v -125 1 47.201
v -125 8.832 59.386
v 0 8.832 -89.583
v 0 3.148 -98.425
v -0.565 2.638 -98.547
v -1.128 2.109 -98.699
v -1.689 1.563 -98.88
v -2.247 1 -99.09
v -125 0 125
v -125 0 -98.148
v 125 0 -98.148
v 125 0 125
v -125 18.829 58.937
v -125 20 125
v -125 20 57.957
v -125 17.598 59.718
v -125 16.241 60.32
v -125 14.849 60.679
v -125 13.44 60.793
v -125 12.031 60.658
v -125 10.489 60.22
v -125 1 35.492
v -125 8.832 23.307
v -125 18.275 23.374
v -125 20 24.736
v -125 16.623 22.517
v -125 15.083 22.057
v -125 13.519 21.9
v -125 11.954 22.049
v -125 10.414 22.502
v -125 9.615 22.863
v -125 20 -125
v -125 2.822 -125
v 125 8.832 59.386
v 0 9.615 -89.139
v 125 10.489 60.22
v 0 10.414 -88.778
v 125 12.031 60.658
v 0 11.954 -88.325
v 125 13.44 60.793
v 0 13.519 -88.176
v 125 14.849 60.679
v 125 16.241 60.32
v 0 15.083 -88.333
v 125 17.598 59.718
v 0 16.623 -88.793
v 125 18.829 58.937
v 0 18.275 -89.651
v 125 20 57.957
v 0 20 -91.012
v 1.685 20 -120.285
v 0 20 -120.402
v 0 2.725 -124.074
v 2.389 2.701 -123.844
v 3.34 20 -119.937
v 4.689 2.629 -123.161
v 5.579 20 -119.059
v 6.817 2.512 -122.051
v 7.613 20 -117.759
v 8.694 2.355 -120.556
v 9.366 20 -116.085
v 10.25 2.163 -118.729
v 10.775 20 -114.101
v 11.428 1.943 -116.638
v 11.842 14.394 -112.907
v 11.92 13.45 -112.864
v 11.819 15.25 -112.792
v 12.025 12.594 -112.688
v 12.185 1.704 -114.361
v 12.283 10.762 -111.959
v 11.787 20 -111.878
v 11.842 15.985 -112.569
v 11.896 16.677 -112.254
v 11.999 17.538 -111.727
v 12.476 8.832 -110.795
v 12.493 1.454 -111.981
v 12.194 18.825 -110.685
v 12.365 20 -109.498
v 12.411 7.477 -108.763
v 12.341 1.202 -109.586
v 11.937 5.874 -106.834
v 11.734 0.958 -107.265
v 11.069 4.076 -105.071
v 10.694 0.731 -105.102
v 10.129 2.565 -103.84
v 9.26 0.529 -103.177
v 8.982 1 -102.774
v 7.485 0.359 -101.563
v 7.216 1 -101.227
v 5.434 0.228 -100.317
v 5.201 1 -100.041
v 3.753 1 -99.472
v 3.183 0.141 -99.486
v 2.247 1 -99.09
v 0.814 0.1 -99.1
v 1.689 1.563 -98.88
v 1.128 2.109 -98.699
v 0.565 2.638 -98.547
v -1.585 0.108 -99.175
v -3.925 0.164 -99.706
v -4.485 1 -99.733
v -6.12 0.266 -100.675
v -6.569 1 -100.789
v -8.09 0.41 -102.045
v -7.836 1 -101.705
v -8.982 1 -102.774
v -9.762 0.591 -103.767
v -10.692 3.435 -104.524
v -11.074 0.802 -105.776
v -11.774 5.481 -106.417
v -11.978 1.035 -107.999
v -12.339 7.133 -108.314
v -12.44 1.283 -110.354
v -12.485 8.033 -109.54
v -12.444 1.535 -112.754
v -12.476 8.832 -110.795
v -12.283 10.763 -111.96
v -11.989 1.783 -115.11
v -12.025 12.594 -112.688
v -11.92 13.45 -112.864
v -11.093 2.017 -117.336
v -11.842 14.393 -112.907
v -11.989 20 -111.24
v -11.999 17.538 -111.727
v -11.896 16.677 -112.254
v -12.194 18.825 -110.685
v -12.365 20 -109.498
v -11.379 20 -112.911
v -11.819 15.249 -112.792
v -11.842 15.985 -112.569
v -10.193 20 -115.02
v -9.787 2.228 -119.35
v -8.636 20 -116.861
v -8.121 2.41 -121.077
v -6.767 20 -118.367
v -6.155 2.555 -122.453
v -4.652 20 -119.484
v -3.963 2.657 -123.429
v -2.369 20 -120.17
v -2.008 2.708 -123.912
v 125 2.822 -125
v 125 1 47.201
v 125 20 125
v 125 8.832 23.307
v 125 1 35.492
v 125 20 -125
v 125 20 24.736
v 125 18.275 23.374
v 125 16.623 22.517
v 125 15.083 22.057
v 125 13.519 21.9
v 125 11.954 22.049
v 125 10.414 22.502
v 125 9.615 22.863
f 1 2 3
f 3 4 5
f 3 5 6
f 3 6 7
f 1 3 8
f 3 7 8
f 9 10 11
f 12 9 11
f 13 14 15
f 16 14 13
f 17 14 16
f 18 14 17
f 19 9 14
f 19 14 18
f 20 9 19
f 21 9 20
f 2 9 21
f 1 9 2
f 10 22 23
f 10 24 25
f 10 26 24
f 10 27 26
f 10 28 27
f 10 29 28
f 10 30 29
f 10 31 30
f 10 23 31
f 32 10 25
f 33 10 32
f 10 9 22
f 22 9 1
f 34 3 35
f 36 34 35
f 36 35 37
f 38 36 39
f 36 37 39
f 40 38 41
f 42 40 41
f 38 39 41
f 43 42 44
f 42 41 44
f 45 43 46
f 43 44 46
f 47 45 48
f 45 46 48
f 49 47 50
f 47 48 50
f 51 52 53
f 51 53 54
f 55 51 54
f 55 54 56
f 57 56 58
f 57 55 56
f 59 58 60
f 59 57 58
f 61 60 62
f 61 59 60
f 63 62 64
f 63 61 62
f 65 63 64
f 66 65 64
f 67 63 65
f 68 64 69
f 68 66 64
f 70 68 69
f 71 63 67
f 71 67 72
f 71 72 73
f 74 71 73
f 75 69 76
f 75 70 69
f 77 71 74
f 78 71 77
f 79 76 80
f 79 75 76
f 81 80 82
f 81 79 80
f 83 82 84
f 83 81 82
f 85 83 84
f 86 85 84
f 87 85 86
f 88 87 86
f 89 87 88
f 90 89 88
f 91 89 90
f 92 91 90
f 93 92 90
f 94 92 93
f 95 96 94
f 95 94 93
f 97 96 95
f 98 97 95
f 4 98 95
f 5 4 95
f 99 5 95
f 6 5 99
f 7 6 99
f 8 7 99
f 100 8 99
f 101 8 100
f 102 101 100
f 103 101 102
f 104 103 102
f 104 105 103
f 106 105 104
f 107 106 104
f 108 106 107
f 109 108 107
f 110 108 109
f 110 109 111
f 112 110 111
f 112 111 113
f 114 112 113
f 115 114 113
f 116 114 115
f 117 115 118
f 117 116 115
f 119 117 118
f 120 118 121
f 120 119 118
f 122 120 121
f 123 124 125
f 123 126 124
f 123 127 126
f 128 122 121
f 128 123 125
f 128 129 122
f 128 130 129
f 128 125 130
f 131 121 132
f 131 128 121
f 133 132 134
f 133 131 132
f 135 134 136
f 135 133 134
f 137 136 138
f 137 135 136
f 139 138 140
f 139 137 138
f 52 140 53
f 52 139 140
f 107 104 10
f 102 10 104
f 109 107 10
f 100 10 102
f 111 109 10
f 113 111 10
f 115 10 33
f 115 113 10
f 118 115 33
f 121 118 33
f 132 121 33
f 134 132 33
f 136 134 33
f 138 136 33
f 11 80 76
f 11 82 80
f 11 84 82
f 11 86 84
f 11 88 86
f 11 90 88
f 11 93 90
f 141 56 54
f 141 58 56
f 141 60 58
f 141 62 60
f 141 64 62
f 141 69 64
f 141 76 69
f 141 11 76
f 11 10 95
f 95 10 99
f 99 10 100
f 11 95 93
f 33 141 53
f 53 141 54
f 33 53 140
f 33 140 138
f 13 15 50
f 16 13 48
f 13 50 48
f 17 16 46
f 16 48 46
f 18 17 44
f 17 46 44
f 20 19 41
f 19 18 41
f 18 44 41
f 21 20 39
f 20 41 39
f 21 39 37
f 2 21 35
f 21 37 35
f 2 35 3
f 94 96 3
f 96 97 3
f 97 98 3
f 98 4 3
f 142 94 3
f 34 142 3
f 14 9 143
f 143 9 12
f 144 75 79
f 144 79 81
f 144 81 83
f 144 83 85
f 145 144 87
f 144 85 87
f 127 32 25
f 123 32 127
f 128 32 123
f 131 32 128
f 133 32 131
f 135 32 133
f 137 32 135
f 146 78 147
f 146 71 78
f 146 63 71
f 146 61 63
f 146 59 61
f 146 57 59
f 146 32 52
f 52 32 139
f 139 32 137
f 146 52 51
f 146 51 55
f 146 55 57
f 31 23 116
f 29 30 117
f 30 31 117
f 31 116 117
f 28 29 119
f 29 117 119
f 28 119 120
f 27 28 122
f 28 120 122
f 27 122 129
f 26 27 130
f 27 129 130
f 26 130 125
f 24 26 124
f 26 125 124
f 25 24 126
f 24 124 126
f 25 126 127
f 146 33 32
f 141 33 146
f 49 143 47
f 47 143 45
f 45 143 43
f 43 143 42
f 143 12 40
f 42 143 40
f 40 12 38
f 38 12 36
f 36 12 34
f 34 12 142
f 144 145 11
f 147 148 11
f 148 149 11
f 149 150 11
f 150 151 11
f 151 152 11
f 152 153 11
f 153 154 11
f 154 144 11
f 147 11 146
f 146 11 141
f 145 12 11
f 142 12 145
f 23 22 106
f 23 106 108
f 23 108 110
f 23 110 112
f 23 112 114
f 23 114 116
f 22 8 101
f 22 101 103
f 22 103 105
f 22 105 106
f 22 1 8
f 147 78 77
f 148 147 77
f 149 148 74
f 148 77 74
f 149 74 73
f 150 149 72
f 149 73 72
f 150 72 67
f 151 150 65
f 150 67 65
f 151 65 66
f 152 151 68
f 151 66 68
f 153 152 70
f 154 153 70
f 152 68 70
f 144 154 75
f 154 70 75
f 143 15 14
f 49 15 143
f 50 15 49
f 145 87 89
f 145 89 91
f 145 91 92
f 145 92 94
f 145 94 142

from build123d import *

# Parameters (mm, degrees)
SKETCH1_W               = 250
SKETCH1_H               = 250
BOSS_EXTRUDE1_DEPTH     = 20
CUT_EXTRUDE1_DEPTH      = 281.223125384
CUT_EXTRUDE2_DEPTH      = 184.527379594
CUT_EXTRUDE2_DEPTH_BACK = 184.527379594
SKETCH3_R               = 12.5
CUT_EXTRUDE3_DEPTH      = 261.116460281
CUT_EXTRUDE5_DEPTH      = 261.116460289


with BuildPart() as part:
    # Sketch1 → Boss-Extrude1 (new body)
    with BuildSketch(Plane(origin=(0, 0, 0), x_dir=(1, 0, 0), z_dir=(0, 1, 0))):
        Rectangle(SKETCH1_W, SKETCH1_H)
    extrude(amount=BOSS_EXTRUDE1_DEPTH)

    # Sketch2 → Cut-Extrude1 (cut, through all)
    with BuildSketch(Plane(origin=(125, 0, 0), x_dir=(0, 0, -1), z_dir=(1, 0, 0))):
        Polygon((125, 2.822268508), (125, 0), (98.147908825, 0), align=None)
    extrude(amount=-CUT_EXTRUDE1_DEPTH, mode=Mode.SUBTRACT)

    # Sketch3 → Cut-Extrude2 (cut, two sides: drawn at the far end of the back side and taken through both)
    with BuildSketch(Plane(origin=(0, -20.175156681, -3.23125924), x_dir=(1, 0, 0), z_dir=(0, -0.9781476007338071, -0.20791169081775307)).offset(-CUT_EXTRUDE2_DEPTH_BACK)):
        with Locations((0, -110.463189586)):
            Circle(SKETCH3_R)
    extrude(amount=CUT_EXTRUDE2_DEPTH + CUT_EXTRUDE2_DEPTH_BACK, mode=Mode.SUBTRACT)

    # Sketch4 → Cut-Extrude3 (cut, through all)
    with BuildSketch(Plane(origin=(56.770360605, 0, -59.986780379), x_dir=(0.7660444431189859, 0, 0.6427876096865301), z_dir=(-0.6427876096865301, 0, 0.7660444431189859))):
        with BuildLine():
            Line((-84.785520804, 20), (-63.4313643, 20))
            ThreePointArc((-63.4313643, 20), (-61.650530379, 14.524902088), (-62.512612953, 8.832373631))
            Line((-62.512612953, 8.832373631), (-70.344986584, 1))
            Line((-70.344986584, 1), (-77.871898519, 1))
            Line((-77.871898519, 1), (-85.704272151, 8.832373631))
            ThreePointArc((-85.704272151, 8.832373631), (-86.566354725, 14.524902088), (-84.785520804, 20))
        make_face()
    extrude(amount=CUT_EXTRUDE3_DEPTH, mode=Mode.SUBTRACT)

    # Sketch9 → Cut-Extrude5 (cut, through all)
    with BuildSketch(Plane(origin=(-56.770360605, 0, -59.986780379), x_dir=(-0.766044443118977, 0, 0.6427876096865405), z_dir=(-0.6427876096865405, 0, -0.766044443118977))):
        with BuildLine():
            Line((-63.4313643, 20), (-84.785520804, 20))
            ThreePointArc((-84.785520804, 20), (-86.566354725, 14.524902088), (-85.704272151, 8.832373631))
            Line((-85.704272151, 8.832373631), (-77.871898519, 1))
            Line((-77.871898519, 1), (-70.344986584, 1))
            Line((-70.344986584, 1), (-62.512612953, 8.832373631))
            ThreePointArc((-62.512612953, 8.832373631), (-61.650530379, 14.524902088), (-63.4313643, 20))
        make_face()
    extrude(amount=-CUT_EXTRUDE5_DEPTH, mode=Mode.SUBTRACT)


solid = part.part
